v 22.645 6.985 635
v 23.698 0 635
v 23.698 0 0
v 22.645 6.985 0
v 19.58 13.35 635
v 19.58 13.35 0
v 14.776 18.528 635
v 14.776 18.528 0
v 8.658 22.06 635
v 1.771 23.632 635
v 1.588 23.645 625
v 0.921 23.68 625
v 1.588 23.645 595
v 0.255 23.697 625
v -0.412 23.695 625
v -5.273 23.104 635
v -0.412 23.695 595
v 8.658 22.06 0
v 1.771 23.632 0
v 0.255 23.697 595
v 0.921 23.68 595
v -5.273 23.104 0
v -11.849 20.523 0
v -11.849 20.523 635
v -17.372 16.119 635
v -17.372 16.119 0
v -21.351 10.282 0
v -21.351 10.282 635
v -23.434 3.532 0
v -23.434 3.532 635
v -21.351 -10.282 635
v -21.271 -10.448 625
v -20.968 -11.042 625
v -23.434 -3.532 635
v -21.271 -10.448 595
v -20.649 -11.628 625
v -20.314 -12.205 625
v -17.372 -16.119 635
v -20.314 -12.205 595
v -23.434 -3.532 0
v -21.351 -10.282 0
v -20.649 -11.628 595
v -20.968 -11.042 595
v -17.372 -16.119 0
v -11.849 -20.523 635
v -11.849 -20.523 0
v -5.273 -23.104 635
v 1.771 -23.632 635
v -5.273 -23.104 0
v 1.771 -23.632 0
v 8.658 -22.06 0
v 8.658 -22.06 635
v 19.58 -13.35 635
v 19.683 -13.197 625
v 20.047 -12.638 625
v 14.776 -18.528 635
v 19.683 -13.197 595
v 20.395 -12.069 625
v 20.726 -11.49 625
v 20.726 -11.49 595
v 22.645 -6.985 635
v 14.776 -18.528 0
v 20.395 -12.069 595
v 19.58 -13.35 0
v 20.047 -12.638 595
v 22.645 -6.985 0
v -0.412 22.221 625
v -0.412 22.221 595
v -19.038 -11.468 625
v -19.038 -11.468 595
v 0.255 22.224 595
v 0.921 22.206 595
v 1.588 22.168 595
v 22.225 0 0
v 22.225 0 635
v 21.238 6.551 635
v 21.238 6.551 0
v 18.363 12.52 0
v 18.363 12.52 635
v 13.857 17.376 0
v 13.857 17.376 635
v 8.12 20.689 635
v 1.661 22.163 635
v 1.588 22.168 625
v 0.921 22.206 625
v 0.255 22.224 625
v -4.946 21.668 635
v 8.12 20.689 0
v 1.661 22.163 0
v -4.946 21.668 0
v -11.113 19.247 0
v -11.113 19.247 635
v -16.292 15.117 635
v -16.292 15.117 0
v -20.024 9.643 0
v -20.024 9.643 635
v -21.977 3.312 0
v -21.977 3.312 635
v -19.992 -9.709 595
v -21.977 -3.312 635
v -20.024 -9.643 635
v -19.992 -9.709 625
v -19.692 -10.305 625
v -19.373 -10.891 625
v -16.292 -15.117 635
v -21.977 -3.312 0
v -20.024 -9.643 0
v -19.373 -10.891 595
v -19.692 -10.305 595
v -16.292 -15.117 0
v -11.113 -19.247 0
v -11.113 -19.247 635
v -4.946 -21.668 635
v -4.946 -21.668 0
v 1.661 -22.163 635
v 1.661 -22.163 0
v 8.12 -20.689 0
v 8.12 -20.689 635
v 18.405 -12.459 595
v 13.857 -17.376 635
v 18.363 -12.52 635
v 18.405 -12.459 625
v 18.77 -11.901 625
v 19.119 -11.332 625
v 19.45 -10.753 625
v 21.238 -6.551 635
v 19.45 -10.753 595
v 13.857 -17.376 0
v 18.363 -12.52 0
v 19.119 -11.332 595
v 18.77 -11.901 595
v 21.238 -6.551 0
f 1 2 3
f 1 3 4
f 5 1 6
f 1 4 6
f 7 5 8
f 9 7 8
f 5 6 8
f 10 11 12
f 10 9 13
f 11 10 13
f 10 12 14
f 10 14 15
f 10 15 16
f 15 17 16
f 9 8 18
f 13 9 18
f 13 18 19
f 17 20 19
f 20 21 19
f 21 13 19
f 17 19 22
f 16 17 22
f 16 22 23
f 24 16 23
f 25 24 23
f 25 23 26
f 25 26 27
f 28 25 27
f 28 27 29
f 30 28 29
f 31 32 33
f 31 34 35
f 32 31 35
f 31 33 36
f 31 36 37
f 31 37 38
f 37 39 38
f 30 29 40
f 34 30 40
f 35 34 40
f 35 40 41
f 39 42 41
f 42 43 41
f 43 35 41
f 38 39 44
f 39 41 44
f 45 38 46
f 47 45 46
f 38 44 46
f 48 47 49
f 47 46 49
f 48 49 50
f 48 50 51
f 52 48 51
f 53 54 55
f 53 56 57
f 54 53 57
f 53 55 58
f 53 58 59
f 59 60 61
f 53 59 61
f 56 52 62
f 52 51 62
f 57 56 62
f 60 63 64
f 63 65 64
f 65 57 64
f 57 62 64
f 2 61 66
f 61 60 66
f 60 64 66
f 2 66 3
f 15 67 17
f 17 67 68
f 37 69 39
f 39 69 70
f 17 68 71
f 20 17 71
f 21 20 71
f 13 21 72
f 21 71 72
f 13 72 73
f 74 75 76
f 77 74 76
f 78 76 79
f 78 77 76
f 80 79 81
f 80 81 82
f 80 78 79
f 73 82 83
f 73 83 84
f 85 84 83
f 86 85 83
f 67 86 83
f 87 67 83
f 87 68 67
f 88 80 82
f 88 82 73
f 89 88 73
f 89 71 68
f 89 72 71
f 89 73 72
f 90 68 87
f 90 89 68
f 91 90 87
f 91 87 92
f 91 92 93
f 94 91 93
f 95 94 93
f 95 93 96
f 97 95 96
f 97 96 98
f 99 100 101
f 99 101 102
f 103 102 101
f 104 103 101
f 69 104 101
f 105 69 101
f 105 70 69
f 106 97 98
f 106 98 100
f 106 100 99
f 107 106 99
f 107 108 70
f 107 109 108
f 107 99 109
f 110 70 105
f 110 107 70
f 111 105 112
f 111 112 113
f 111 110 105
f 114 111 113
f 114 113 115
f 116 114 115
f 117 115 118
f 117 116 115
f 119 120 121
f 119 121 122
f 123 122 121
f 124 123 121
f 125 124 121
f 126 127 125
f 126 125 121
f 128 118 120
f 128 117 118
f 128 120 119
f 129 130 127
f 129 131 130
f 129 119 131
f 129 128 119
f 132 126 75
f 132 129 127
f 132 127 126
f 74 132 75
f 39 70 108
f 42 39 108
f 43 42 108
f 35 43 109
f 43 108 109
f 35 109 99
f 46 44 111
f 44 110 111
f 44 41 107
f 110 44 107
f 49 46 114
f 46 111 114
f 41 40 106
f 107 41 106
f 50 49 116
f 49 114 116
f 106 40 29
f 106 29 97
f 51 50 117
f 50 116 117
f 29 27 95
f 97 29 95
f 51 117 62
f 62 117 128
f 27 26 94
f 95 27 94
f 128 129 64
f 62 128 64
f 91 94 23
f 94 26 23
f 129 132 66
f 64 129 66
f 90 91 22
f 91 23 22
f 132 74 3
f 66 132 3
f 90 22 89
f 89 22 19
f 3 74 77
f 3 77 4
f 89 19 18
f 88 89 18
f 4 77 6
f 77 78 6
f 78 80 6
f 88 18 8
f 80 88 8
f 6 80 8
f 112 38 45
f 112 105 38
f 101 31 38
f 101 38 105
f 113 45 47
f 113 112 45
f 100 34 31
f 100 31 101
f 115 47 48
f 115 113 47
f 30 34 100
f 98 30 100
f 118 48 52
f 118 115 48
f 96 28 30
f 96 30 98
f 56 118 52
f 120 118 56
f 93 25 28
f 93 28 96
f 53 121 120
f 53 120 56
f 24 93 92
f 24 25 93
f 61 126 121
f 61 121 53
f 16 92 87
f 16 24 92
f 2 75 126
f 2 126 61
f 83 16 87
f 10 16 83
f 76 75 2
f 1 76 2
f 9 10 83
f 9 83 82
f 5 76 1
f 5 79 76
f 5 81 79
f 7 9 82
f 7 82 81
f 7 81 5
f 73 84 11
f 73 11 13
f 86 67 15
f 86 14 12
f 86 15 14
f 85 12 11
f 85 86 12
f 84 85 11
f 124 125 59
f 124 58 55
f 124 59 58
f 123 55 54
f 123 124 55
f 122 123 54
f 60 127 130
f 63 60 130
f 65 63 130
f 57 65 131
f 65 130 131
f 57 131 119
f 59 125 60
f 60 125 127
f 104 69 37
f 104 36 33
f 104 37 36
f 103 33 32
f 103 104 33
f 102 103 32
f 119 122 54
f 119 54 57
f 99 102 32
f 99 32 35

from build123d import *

# Parameters (mm, degrees)
SKETCH1_R           = 23.6982
SKETCH1_R_2         = 22.225
BOSS_EXTRUDE1_DEPTH = 635
CUT_EXTRUDE1_START  = -77.831769
SKETCH2_W           = 2
SKETCH2_H           = 30
CUT_EXTRUDE1_DEPTH  = 1.529969
CIRPATTERN2_COUNT   = 3


with BuildPart() as part:
    # Sketch1 → Boss-Extrude1 (new body)
    with BuildSketch(Plane.XY):
        Circle(SKETCH1_R)
        Circle(SKETCH1_R_2, mode=Mode.SUBTRACT)
    extrude(amount=BOSS_EXTRUDE1_DEPTH)

    # Sketch2 → Cut-Extrude1 (cut)
    with BuildSketch(Plane(origin=(0, 100, 0), x_dir=(1, 0, 0), z_dir=(0, 1, 0)).offset(CUT_EXTRUDE1_START)):
        with Locations((0.5875, -610)):
            Rectangle(SKETCH2_W, SKETCH2_H)
    cut_extrude1 = extrude(amount=CUT_EXTRUDE1_DEPTH, mode=Mode.SUBTRACT)

    # CirPattern2: Cut-Extrude1 ×3 about axis
    cirpattern2_axis = Axis((0, 0, 0), (0, 0, 1))
    for i in range(1, CIRPATTERN2_COUNT):
        add(cut_extrude1.rotate(cirpattern2_axis, i * 360 / CIRPATTERN2_COUNT), mode=Mode.SUBTRACT)


solid = part.part
